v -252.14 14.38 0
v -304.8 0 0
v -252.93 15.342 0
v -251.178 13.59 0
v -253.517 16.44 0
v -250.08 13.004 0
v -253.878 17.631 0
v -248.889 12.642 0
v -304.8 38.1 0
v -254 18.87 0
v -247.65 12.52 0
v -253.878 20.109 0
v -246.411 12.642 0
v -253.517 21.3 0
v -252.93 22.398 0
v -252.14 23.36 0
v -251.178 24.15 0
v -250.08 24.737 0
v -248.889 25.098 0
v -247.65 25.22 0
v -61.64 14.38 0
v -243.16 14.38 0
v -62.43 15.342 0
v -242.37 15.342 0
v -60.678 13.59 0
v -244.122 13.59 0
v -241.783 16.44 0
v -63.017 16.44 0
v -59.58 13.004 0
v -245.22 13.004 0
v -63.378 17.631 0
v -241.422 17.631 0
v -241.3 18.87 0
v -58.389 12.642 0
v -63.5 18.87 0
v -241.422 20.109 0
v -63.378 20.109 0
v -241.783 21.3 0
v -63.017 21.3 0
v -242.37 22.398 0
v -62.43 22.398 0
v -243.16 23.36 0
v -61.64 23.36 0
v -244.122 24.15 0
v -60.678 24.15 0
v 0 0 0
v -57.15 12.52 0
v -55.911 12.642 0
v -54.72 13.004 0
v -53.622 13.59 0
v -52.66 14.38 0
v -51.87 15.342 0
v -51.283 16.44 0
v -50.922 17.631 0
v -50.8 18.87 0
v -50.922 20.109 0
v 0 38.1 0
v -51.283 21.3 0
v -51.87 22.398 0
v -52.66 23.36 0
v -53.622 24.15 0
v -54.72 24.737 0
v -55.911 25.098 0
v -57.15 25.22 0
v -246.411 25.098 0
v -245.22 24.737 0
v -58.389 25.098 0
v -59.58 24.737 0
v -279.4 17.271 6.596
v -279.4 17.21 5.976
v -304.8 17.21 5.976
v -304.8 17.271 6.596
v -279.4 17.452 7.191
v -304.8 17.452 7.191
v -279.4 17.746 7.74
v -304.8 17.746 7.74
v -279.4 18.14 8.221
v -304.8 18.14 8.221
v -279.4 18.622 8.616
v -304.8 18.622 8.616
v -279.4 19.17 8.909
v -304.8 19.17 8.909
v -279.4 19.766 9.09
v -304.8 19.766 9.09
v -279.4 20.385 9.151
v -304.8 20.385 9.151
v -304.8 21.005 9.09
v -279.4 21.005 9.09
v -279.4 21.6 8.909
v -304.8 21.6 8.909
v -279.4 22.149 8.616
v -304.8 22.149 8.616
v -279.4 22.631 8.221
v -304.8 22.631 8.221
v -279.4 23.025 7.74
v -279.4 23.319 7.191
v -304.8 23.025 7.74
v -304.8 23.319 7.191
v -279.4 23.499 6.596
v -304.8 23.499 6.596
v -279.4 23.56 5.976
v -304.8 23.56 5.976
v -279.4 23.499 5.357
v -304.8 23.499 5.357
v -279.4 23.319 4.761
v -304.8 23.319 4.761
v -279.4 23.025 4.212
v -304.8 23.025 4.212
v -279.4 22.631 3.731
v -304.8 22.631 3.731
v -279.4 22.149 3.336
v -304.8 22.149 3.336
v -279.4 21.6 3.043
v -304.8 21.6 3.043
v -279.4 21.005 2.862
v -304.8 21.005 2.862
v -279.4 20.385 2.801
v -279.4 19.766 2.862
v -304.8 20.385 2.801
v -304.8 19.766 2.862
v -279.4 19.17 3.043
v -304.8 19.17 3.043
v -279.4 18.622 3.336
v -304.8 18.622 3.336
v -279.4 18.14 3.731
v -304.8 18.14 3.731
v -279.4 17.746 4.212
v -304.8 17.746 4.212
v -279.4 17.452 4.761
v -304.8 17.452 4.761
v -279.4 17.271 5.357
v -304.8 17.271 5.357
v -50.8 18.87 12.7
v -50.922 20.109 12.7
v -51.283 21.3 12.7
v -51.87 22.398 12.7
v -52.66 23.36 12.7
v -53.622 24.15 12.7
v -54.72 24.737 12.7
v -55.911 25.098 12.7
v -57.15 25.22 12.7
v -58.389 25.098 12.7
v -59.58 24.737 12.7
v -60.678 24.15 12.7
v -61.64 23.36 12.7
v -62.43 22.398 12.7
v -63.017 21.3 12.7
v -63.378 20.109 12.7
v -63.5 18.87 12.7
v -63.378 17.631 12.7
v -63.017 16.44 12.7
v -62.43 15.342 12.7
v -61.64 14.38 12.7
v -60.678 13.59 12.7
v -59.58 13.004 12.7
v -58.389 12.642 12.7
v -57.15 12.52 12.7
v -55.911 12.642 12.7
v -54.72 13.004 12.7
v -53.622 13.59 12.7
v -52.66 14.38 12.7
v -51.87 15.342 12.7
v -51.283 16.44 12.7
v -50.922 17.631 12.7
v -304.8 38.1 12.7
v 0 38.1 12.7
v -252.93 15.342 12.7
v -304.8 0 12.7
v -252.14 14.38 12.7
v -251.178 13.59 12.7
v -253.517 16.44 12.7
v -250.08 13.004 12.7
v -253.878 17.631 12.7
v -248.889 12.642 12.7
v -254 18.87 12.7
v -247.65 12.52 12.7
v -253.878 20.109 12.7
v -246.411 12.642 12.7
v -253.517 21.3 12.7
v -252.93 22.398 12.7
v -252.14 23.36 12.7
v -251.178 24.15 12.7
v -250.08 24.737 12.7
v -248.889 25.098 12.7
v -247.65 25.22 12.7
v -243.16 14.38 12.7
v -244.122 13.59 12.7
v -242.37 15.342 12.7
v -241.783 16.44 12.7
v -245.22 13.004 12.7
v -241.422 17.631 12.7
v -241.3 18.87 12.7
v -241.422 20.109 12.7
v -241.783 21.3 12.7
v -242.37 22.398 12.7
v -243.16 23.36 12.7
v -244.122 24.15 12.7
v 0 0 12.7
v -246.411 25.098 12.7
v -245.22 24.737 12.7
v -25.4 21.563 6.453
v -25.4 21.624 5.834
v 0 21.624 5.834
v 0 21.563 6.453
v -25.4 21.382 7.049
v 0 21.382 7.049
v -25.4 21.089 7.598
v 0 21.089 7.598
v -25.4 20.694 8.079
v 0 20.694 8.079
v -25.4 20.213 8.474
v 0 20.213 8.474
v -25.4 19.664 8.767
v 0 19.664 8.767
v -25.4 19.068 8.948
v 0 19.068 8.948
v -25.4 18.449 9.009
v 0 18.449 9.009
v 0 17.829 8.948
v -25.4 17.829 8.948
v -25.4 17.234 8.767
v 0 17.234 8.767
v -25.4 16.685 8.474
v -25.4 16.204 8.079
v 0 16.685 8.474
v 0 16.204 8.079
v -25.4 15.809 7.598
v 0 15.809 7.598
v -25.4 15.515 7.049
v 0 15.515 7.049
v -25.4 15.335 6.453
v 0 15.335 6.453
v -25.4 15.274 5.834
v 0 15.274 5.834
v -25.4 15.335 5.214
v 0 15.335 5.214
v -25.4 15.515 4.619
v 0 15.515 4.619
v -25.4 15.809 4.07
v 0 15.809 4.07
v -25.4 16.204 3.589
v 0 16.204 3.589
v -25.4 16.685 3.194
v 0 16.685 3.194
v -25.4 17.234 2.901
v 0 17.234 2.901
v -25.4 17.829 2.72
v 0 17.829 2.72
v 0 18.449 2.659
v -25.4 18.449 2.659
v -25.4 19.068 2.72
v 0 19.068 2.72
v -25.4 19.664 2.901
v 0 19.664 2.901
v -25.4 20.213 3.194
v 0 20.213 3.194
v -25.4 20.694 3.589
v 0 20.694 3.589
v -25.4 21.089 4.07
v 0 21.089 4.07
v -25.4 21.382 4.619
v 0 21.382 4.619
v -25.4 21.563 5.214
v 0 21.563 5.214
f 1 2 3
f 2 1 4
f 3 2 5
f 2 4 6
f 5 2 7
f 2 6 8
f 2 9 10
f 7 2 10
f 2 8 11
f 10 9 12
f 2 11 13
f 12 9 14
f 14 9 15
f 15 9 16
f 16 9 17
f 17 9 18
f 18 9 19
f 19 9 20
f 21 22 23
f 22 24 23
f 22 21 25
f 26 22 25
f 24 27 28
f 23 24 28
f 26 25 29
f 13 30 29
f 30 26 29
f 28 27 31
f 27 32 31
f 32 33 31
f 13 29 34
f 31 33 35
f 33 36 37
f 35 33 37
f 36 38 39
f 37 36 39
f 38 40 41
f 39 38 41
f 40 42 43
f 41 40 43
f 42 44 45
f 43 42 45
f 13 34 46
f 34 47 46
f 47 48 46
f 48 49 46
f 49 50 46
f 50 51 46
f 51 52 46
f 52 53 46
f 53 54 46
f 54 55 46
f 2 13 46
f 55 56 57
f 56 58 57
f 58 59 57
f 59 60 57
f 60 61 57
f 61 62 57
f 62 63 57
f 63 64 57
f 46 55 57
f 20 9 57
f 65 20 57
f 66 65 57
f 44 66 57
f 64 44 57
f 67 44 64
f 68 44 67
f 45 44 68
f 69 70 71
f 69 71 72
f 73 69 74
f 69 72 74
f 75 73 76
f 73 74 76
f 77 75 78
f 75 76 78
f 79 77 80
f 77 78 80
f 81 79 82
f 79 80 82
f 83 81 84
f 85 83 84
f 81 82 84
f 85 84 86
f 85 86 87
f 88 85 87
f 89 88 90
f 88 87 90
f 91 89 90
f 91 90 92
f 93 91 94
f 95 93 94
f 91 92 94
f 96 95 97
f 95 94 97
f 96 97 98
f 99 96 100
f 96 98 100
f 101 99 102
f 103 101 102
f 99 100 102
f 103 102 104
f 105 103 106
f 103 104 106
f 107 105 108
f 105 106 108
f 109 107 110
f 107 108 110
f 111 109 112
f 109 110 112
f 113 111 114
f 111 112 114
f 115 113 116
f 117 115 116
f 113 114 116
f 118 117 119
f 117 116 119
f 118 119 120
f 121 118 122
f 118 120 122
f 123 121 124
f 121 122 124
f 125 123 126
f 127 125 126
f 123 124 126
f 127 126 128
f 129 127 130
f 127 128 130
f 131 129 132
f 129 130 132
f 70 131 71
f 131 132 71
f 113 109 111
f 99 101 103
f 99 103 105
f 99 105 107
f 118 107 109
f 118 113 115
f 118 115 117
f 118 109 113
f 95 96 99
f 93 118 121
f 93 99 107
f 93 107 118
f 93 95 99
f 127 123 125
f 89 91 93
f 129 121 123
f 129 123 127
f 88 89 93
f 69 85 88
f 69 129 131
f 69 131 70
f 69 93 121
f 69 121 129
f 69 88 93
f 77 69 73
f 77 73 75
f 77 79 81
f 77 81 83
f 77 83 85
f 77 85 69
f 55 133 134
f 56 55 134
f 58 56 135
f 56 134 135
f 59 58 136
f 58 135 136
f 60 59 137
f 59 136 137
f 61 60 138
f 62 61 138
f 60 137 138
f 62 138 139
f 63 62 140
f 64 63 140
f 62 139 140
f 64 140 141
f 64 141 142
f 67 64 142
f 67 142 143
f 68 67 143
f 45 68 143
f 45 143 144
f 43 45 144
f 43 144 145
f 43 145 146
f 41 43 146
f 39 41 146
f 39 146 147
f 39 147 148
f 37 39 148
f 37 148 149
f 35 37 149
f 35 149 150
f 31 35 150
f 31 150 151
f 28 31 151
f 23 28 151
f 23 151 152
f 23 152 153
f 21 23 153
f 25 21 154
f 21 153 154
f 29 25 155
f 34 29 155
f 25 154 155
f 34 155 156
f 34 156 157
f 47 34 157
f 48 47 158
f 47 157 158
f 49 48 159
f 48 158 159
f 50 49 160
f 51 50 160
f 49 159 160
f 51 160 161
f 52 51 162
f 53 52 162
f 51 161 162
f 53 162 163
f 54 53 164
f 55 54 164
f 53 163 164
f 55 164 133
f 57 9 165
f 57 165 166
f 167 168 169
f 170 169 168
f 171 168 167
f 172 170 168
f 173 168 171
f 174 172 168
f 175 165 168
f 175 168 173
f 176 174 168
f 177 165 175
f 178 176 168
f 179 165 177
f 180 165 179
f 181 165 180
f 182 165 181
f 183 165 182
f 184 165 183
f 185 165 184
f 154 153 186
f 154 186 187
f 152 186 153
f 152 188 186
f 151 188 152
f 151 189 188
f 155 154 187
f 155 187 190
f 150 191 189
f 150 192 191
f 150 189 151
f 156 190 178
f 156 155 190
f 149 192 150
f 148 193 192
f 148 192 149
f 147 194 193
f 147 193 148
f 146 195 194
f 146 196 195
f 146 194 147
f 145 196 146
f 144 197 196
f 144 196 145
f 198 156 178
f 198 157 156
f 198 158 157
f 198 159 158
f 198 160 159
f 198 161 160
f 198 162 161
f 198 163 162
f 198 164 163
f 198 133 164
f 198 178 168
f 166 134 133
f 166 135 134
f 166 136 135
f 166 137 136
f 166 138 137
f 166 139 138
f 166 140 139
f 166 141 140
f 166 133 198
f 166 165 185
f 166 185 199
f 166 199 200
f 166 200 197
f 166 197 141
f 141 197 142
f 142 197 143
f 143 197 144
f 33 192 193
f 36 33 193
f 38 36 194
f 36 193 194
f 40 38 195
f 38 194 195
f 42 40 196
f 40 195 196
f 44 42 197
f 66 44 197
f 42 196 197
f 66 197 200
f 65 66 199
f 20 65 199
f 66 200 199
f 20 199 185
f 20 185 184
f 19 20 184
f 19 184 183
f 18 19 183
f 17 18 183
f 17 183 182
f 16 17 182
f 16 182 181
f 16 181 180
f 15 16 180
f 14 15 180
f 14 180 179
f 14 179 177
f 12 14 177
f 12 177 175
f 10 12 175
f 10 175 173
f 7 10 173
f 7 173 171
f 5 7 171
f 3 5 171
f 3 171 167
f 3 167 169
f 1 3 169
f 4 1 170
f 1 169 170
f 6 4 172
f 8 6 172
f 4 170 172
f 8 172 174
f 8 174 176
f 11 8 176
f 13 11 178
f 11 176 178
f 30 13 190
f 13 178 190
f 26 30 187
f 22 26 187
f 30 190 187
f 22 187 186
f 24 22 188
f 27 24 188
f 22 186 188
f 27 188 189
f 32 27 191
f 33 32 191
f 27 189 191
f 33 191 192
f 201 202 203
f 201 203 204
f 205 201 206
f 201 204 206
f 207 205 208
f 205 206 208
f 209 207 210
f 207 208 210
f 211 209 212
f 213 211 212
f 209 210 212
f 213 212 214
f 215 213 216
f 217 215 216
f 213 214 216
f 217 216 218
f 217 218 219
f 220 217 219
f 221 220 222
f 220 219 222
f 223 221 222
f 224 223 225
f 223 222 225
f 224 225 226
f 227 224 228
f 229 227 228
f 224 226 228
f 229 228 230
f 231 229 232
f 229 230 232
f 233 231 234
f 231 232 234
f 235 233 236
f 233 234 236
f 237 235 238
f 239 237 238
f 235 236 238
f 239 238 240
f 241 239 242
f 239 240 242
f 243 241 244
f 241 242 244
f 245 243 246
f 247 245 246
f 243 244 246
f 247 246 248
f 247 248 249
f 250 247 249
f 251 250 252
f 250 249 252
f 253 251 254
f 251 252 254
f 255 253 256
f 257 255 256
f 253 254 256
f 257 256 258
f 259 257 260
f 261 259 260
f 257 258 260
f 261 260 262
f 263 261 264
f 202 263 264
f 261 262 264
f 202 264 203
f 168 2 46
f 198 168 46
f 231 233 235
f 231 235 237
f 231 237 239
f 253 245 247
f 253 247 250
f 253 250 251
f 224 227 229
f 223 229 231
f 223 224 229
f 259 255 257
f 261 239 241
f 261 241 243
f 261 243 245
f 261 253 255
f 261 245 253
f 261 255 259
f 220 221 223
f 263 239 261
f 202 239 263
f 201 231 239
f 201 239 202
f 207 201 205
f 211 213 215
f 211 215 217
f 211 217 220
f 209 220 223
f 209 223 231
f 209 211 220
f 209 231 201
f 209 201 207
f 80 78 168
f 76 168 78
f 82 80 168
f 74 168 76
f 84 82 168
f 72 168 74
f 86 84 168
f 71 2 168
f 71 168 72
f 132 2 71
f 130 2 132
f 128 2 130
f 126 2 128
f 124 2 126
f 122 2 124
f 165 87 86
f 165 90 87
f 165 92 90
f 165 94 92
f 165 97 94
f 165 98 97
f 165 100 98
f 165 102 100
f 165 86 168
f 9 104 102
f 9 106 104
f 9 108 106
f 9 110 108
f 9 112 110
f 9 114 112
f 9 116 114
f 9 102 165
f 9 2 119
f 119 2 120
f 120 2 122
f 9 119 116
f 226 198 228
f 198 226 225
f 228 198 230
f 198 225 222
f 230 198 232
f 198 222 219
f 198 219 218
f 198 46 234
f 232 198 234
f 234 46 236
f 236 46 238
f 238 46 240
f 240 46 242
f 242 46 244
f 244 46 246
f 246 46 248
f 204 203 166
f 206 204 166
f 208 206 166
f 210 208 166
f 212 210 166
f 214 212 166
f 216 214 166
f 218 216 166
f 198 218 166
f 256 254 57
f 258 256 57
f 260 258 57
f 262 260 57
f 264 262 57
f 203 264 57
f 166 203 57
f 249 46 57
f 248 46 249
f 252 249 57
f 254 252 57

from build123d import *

# Parameters (mm, degrees)
F0_W     = 304.8
F0_H     = 38.1
F1_DEPTH = 12.7
F2_R     = 3.175
F3_DEPTH = 25.4
F4_R     = 3.175
F5_DEPTH = 25.4
F6_R     = 6.35
F7_DEPTH = 12.701


with BuildPart() as f1:
    # F0 (on Top) → F1 (new body)
    with BuildSketch(Plane.XY):
        with Locations((-152.4, 19.05)):
            Rectangle(F0_W, F0_H)
    extrude(amount=F1_DEPTH)

    # F2 (on face) → F3 (cut)
    with BuildSketch(Plane.YZ):
        with Locations((18.448802, 5.833903)):
            Circle(F2_R)
    extrude(amount=-F3_DEPTH, mode=Mode.SUBTRACT)

    # F4 (on face) → F5 (cut)
    with BuildSketch(Plane(origin=(-304.8, 0, 0), x_dir=(0, -1, 0), z_dir=(-1, 0, 0))):
        with Locations((-20.385453, 5.976154)):
            Circle(F4_R)
    extrude(amount=-F5_DEPTH, mode=Mode.SUBTRACT)

    # F6 (on face) → F7 (cut, through all)
    with BuildSketch(Plane.XY.offset(12.7)):
        with Locations((-247.65, 18.870285)):
            Circle(F6_R)
        with Locations((-57.15, 18.870285)):
            Circle(F6_R)
    extrude(amount=-F7_DEPTH, mode=Mode.SUBTRACT)


solid = f1.part
